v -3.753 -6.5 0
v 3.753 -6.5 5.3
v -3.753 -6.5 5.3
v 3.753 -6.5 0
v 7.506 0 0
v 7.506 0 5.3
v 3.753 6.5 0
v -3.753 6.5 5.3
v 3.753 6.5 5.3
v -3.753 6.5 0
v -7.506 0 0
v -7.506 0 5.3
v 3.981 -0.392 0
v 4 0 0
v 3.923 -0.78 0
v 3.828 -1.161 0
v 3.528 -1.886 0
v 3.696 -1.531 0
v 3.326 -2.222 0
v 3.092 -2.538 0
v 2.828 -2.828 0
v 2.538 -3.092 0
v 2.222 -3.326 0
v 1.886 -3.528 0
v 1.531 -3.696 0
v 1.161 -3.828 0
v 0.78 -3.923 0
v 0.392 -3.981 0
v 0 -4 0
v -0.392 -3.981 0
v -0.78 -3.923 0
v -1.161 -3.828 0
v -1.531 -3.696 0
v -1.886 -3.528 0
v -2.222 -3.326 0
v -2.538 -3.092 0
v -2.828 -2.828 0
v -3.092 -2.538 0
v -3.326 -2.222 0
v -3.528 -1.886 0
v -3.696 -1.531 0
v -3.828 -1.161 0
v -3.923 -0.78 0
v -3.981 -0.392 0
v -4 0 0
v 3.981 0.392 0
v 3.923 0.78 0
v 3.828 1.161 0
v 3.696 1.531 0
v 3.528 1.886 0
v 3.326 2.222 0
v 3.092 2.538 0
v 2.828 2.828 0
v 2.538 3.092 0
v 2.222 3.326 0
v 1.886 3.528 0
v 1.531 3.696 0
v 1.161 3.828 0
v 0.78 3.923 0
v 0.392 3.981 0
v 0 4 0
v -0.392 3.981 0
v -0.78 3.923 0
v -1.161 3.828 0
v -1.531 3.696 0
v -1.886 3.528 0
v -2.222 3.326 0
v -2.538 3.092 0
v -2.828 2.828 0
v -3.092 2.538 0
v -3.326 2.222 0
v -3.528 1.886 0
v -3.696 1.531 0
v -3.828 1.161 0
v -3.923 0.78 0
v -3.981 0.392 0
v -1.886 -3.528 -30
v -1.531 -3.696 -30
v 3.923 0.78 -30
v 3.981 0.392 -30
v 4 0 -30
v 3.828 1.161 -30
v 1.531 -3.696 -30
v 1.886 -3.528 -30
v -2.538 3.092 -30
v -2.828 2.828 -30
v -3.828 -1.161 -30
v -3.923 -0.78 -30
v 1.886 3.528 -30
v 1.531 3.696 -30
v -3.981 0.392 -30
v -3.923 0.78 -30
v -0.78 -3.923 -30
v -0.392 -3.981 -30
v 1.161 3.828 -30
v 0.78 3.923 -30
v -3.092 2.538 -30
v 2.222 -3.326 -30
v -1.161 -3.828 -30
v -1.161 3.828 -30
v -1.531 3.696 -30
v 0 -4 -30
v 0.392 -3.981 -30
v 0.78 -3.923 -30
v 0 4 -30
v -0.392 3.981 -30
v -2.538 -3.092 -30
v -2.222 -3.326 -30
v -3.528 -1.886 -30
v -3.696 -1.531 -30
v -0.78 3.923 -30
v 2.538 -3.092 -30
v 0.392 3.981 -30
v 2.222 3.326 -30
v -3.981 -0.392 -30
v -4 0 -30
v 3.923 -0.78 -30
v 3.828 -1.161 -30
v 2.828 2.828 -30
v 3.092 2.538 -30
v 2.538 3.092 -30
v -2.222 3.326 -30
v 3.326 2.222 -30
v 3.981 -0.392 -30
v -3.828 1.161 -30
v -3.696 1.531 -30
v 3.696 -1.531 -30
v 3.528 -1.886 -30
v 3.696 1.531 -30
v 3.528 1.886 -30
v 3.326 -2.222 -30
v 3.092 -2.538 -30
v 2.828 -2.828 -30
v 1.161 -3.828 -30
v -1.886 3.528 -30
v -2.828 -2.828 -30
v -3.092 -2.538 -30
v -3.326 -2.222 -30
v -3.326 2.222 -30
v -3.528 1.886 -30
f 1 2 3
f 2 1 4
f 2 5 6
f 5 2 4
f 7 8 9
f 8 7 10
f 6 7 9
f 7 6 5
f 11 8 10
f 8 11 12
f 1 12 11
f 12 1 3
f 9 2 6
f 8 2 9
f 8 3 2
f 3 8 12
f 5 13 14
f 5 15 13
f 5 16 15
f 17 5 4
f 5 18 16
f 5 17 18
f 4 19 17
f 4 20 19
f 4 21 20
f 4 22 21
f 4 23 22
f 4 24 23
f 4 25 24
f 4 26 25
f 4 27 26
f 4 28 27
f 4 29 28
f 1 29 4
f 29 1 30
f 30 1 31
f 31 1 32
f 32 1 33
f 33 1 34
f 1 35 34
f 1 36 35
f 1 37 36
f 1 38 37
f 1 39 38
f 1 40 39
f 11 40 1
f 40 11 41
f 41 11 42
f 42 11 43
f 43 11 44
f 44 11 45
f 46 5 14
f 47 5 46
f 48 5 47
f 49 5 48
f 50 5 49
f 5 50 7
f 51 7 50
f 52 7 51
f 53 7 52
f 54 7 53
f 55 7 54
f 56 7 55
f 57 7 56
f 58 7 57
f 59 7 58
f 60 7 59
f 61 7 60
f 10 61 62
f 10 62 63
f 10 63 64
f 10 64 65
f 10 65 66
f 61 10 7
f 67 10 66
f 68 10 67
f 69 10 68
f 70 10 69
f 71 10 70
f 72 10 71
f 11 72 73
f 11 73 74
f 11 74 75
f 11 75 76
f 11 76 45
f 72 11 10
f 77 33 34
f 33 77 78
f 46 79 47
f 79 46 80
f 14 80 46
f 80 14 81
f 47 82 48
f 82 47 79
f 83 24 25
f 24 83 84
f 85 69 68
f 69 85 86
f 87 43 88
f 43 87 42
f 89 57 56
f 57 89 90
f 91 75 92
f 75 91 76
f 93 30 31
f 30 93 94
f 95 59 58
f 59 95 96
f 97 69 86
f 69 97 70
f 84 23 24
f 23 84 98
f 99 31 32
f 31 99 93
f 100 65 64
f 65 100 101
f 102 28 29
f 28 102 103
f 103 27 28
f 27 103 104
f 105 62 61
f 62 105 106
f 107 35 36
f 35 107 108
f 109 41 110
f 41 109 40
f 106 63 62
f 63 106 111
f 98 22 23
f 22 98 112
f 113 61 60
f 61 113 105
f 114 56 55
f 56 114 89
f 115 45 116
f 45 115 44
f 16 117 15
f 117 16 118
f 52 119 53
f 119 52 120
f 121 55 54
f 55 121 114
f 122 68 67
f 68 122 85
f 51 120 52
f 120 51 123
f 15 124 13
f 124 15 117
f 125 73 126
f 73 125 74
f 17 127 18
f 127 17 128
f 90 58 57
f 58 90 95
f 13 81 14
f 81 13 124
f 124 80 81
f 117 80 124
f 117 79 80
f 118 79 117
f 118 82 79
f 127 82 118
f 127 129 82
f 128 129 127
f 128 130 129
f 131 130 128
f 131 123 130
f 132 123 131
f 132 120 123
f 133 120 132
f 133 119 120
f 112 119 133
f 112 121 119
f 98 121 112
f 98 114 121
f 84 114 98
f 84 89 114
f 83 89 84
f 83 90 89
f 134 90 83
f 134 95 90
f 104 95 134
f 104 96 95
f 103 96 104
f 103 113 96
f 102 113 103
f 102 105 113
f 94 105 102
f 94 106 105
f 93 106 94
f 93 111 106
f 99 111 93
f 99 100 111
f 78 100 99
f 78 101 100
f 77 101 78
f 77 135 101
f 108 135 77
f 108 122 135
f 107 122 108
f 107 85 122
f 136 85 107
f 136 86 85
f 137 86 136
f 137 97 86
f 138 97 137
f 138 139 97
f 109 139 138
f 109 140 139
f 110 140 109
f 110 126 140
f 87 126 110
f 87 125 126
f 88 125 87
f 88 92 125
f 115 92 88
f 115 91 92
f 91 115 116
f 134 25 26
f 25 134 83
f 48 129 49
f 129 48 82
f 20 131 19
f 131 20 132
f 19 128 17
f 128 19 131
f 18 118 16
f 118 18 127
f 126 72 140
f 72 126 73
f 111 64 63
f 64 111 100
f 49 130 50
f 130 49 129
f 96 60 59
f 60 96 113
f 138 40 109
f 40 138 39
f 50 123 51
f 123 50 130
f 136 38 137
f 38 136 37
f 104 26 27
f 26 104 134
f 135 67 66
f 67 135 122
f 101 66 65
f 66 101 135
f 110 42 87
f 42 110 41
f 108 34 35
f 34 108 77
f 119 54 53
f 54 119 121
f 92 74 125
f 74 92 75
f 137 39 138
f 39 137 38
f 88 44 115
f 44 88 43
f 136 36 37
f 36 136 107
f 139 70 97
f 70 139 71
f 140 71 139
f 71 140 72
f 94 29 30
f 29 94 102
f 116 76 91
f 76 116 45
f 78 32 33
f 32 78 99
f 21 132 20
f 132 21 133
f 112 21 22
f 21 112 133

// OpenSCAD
// M8 hex bolt (simplified: no thread)
// Units: mm

$fn = 64;

head_af = 13;     // across flats
head_h  = 5.3;    // head height
shaft_d = 8;      // shank diameter
shaft_l = 30;     // shank length

module hex_prism_af(af, h) {
    // For a regular hexagon: across flats = 2 * r * cos(30°)
    r = af / (2 * cos(30));
    cylinder(h = h, r = r, $fn = 6);
}

union() {
    // Head: bottom face at z = 0, extends to +Z
    hex_prism_af(head_af, head_h);

    // Shaft: centered on axis, extending to -Z
    translate([0, 0, -shaft_l])
        cylinder(h = shaft_l, d = shaft_d);
}
